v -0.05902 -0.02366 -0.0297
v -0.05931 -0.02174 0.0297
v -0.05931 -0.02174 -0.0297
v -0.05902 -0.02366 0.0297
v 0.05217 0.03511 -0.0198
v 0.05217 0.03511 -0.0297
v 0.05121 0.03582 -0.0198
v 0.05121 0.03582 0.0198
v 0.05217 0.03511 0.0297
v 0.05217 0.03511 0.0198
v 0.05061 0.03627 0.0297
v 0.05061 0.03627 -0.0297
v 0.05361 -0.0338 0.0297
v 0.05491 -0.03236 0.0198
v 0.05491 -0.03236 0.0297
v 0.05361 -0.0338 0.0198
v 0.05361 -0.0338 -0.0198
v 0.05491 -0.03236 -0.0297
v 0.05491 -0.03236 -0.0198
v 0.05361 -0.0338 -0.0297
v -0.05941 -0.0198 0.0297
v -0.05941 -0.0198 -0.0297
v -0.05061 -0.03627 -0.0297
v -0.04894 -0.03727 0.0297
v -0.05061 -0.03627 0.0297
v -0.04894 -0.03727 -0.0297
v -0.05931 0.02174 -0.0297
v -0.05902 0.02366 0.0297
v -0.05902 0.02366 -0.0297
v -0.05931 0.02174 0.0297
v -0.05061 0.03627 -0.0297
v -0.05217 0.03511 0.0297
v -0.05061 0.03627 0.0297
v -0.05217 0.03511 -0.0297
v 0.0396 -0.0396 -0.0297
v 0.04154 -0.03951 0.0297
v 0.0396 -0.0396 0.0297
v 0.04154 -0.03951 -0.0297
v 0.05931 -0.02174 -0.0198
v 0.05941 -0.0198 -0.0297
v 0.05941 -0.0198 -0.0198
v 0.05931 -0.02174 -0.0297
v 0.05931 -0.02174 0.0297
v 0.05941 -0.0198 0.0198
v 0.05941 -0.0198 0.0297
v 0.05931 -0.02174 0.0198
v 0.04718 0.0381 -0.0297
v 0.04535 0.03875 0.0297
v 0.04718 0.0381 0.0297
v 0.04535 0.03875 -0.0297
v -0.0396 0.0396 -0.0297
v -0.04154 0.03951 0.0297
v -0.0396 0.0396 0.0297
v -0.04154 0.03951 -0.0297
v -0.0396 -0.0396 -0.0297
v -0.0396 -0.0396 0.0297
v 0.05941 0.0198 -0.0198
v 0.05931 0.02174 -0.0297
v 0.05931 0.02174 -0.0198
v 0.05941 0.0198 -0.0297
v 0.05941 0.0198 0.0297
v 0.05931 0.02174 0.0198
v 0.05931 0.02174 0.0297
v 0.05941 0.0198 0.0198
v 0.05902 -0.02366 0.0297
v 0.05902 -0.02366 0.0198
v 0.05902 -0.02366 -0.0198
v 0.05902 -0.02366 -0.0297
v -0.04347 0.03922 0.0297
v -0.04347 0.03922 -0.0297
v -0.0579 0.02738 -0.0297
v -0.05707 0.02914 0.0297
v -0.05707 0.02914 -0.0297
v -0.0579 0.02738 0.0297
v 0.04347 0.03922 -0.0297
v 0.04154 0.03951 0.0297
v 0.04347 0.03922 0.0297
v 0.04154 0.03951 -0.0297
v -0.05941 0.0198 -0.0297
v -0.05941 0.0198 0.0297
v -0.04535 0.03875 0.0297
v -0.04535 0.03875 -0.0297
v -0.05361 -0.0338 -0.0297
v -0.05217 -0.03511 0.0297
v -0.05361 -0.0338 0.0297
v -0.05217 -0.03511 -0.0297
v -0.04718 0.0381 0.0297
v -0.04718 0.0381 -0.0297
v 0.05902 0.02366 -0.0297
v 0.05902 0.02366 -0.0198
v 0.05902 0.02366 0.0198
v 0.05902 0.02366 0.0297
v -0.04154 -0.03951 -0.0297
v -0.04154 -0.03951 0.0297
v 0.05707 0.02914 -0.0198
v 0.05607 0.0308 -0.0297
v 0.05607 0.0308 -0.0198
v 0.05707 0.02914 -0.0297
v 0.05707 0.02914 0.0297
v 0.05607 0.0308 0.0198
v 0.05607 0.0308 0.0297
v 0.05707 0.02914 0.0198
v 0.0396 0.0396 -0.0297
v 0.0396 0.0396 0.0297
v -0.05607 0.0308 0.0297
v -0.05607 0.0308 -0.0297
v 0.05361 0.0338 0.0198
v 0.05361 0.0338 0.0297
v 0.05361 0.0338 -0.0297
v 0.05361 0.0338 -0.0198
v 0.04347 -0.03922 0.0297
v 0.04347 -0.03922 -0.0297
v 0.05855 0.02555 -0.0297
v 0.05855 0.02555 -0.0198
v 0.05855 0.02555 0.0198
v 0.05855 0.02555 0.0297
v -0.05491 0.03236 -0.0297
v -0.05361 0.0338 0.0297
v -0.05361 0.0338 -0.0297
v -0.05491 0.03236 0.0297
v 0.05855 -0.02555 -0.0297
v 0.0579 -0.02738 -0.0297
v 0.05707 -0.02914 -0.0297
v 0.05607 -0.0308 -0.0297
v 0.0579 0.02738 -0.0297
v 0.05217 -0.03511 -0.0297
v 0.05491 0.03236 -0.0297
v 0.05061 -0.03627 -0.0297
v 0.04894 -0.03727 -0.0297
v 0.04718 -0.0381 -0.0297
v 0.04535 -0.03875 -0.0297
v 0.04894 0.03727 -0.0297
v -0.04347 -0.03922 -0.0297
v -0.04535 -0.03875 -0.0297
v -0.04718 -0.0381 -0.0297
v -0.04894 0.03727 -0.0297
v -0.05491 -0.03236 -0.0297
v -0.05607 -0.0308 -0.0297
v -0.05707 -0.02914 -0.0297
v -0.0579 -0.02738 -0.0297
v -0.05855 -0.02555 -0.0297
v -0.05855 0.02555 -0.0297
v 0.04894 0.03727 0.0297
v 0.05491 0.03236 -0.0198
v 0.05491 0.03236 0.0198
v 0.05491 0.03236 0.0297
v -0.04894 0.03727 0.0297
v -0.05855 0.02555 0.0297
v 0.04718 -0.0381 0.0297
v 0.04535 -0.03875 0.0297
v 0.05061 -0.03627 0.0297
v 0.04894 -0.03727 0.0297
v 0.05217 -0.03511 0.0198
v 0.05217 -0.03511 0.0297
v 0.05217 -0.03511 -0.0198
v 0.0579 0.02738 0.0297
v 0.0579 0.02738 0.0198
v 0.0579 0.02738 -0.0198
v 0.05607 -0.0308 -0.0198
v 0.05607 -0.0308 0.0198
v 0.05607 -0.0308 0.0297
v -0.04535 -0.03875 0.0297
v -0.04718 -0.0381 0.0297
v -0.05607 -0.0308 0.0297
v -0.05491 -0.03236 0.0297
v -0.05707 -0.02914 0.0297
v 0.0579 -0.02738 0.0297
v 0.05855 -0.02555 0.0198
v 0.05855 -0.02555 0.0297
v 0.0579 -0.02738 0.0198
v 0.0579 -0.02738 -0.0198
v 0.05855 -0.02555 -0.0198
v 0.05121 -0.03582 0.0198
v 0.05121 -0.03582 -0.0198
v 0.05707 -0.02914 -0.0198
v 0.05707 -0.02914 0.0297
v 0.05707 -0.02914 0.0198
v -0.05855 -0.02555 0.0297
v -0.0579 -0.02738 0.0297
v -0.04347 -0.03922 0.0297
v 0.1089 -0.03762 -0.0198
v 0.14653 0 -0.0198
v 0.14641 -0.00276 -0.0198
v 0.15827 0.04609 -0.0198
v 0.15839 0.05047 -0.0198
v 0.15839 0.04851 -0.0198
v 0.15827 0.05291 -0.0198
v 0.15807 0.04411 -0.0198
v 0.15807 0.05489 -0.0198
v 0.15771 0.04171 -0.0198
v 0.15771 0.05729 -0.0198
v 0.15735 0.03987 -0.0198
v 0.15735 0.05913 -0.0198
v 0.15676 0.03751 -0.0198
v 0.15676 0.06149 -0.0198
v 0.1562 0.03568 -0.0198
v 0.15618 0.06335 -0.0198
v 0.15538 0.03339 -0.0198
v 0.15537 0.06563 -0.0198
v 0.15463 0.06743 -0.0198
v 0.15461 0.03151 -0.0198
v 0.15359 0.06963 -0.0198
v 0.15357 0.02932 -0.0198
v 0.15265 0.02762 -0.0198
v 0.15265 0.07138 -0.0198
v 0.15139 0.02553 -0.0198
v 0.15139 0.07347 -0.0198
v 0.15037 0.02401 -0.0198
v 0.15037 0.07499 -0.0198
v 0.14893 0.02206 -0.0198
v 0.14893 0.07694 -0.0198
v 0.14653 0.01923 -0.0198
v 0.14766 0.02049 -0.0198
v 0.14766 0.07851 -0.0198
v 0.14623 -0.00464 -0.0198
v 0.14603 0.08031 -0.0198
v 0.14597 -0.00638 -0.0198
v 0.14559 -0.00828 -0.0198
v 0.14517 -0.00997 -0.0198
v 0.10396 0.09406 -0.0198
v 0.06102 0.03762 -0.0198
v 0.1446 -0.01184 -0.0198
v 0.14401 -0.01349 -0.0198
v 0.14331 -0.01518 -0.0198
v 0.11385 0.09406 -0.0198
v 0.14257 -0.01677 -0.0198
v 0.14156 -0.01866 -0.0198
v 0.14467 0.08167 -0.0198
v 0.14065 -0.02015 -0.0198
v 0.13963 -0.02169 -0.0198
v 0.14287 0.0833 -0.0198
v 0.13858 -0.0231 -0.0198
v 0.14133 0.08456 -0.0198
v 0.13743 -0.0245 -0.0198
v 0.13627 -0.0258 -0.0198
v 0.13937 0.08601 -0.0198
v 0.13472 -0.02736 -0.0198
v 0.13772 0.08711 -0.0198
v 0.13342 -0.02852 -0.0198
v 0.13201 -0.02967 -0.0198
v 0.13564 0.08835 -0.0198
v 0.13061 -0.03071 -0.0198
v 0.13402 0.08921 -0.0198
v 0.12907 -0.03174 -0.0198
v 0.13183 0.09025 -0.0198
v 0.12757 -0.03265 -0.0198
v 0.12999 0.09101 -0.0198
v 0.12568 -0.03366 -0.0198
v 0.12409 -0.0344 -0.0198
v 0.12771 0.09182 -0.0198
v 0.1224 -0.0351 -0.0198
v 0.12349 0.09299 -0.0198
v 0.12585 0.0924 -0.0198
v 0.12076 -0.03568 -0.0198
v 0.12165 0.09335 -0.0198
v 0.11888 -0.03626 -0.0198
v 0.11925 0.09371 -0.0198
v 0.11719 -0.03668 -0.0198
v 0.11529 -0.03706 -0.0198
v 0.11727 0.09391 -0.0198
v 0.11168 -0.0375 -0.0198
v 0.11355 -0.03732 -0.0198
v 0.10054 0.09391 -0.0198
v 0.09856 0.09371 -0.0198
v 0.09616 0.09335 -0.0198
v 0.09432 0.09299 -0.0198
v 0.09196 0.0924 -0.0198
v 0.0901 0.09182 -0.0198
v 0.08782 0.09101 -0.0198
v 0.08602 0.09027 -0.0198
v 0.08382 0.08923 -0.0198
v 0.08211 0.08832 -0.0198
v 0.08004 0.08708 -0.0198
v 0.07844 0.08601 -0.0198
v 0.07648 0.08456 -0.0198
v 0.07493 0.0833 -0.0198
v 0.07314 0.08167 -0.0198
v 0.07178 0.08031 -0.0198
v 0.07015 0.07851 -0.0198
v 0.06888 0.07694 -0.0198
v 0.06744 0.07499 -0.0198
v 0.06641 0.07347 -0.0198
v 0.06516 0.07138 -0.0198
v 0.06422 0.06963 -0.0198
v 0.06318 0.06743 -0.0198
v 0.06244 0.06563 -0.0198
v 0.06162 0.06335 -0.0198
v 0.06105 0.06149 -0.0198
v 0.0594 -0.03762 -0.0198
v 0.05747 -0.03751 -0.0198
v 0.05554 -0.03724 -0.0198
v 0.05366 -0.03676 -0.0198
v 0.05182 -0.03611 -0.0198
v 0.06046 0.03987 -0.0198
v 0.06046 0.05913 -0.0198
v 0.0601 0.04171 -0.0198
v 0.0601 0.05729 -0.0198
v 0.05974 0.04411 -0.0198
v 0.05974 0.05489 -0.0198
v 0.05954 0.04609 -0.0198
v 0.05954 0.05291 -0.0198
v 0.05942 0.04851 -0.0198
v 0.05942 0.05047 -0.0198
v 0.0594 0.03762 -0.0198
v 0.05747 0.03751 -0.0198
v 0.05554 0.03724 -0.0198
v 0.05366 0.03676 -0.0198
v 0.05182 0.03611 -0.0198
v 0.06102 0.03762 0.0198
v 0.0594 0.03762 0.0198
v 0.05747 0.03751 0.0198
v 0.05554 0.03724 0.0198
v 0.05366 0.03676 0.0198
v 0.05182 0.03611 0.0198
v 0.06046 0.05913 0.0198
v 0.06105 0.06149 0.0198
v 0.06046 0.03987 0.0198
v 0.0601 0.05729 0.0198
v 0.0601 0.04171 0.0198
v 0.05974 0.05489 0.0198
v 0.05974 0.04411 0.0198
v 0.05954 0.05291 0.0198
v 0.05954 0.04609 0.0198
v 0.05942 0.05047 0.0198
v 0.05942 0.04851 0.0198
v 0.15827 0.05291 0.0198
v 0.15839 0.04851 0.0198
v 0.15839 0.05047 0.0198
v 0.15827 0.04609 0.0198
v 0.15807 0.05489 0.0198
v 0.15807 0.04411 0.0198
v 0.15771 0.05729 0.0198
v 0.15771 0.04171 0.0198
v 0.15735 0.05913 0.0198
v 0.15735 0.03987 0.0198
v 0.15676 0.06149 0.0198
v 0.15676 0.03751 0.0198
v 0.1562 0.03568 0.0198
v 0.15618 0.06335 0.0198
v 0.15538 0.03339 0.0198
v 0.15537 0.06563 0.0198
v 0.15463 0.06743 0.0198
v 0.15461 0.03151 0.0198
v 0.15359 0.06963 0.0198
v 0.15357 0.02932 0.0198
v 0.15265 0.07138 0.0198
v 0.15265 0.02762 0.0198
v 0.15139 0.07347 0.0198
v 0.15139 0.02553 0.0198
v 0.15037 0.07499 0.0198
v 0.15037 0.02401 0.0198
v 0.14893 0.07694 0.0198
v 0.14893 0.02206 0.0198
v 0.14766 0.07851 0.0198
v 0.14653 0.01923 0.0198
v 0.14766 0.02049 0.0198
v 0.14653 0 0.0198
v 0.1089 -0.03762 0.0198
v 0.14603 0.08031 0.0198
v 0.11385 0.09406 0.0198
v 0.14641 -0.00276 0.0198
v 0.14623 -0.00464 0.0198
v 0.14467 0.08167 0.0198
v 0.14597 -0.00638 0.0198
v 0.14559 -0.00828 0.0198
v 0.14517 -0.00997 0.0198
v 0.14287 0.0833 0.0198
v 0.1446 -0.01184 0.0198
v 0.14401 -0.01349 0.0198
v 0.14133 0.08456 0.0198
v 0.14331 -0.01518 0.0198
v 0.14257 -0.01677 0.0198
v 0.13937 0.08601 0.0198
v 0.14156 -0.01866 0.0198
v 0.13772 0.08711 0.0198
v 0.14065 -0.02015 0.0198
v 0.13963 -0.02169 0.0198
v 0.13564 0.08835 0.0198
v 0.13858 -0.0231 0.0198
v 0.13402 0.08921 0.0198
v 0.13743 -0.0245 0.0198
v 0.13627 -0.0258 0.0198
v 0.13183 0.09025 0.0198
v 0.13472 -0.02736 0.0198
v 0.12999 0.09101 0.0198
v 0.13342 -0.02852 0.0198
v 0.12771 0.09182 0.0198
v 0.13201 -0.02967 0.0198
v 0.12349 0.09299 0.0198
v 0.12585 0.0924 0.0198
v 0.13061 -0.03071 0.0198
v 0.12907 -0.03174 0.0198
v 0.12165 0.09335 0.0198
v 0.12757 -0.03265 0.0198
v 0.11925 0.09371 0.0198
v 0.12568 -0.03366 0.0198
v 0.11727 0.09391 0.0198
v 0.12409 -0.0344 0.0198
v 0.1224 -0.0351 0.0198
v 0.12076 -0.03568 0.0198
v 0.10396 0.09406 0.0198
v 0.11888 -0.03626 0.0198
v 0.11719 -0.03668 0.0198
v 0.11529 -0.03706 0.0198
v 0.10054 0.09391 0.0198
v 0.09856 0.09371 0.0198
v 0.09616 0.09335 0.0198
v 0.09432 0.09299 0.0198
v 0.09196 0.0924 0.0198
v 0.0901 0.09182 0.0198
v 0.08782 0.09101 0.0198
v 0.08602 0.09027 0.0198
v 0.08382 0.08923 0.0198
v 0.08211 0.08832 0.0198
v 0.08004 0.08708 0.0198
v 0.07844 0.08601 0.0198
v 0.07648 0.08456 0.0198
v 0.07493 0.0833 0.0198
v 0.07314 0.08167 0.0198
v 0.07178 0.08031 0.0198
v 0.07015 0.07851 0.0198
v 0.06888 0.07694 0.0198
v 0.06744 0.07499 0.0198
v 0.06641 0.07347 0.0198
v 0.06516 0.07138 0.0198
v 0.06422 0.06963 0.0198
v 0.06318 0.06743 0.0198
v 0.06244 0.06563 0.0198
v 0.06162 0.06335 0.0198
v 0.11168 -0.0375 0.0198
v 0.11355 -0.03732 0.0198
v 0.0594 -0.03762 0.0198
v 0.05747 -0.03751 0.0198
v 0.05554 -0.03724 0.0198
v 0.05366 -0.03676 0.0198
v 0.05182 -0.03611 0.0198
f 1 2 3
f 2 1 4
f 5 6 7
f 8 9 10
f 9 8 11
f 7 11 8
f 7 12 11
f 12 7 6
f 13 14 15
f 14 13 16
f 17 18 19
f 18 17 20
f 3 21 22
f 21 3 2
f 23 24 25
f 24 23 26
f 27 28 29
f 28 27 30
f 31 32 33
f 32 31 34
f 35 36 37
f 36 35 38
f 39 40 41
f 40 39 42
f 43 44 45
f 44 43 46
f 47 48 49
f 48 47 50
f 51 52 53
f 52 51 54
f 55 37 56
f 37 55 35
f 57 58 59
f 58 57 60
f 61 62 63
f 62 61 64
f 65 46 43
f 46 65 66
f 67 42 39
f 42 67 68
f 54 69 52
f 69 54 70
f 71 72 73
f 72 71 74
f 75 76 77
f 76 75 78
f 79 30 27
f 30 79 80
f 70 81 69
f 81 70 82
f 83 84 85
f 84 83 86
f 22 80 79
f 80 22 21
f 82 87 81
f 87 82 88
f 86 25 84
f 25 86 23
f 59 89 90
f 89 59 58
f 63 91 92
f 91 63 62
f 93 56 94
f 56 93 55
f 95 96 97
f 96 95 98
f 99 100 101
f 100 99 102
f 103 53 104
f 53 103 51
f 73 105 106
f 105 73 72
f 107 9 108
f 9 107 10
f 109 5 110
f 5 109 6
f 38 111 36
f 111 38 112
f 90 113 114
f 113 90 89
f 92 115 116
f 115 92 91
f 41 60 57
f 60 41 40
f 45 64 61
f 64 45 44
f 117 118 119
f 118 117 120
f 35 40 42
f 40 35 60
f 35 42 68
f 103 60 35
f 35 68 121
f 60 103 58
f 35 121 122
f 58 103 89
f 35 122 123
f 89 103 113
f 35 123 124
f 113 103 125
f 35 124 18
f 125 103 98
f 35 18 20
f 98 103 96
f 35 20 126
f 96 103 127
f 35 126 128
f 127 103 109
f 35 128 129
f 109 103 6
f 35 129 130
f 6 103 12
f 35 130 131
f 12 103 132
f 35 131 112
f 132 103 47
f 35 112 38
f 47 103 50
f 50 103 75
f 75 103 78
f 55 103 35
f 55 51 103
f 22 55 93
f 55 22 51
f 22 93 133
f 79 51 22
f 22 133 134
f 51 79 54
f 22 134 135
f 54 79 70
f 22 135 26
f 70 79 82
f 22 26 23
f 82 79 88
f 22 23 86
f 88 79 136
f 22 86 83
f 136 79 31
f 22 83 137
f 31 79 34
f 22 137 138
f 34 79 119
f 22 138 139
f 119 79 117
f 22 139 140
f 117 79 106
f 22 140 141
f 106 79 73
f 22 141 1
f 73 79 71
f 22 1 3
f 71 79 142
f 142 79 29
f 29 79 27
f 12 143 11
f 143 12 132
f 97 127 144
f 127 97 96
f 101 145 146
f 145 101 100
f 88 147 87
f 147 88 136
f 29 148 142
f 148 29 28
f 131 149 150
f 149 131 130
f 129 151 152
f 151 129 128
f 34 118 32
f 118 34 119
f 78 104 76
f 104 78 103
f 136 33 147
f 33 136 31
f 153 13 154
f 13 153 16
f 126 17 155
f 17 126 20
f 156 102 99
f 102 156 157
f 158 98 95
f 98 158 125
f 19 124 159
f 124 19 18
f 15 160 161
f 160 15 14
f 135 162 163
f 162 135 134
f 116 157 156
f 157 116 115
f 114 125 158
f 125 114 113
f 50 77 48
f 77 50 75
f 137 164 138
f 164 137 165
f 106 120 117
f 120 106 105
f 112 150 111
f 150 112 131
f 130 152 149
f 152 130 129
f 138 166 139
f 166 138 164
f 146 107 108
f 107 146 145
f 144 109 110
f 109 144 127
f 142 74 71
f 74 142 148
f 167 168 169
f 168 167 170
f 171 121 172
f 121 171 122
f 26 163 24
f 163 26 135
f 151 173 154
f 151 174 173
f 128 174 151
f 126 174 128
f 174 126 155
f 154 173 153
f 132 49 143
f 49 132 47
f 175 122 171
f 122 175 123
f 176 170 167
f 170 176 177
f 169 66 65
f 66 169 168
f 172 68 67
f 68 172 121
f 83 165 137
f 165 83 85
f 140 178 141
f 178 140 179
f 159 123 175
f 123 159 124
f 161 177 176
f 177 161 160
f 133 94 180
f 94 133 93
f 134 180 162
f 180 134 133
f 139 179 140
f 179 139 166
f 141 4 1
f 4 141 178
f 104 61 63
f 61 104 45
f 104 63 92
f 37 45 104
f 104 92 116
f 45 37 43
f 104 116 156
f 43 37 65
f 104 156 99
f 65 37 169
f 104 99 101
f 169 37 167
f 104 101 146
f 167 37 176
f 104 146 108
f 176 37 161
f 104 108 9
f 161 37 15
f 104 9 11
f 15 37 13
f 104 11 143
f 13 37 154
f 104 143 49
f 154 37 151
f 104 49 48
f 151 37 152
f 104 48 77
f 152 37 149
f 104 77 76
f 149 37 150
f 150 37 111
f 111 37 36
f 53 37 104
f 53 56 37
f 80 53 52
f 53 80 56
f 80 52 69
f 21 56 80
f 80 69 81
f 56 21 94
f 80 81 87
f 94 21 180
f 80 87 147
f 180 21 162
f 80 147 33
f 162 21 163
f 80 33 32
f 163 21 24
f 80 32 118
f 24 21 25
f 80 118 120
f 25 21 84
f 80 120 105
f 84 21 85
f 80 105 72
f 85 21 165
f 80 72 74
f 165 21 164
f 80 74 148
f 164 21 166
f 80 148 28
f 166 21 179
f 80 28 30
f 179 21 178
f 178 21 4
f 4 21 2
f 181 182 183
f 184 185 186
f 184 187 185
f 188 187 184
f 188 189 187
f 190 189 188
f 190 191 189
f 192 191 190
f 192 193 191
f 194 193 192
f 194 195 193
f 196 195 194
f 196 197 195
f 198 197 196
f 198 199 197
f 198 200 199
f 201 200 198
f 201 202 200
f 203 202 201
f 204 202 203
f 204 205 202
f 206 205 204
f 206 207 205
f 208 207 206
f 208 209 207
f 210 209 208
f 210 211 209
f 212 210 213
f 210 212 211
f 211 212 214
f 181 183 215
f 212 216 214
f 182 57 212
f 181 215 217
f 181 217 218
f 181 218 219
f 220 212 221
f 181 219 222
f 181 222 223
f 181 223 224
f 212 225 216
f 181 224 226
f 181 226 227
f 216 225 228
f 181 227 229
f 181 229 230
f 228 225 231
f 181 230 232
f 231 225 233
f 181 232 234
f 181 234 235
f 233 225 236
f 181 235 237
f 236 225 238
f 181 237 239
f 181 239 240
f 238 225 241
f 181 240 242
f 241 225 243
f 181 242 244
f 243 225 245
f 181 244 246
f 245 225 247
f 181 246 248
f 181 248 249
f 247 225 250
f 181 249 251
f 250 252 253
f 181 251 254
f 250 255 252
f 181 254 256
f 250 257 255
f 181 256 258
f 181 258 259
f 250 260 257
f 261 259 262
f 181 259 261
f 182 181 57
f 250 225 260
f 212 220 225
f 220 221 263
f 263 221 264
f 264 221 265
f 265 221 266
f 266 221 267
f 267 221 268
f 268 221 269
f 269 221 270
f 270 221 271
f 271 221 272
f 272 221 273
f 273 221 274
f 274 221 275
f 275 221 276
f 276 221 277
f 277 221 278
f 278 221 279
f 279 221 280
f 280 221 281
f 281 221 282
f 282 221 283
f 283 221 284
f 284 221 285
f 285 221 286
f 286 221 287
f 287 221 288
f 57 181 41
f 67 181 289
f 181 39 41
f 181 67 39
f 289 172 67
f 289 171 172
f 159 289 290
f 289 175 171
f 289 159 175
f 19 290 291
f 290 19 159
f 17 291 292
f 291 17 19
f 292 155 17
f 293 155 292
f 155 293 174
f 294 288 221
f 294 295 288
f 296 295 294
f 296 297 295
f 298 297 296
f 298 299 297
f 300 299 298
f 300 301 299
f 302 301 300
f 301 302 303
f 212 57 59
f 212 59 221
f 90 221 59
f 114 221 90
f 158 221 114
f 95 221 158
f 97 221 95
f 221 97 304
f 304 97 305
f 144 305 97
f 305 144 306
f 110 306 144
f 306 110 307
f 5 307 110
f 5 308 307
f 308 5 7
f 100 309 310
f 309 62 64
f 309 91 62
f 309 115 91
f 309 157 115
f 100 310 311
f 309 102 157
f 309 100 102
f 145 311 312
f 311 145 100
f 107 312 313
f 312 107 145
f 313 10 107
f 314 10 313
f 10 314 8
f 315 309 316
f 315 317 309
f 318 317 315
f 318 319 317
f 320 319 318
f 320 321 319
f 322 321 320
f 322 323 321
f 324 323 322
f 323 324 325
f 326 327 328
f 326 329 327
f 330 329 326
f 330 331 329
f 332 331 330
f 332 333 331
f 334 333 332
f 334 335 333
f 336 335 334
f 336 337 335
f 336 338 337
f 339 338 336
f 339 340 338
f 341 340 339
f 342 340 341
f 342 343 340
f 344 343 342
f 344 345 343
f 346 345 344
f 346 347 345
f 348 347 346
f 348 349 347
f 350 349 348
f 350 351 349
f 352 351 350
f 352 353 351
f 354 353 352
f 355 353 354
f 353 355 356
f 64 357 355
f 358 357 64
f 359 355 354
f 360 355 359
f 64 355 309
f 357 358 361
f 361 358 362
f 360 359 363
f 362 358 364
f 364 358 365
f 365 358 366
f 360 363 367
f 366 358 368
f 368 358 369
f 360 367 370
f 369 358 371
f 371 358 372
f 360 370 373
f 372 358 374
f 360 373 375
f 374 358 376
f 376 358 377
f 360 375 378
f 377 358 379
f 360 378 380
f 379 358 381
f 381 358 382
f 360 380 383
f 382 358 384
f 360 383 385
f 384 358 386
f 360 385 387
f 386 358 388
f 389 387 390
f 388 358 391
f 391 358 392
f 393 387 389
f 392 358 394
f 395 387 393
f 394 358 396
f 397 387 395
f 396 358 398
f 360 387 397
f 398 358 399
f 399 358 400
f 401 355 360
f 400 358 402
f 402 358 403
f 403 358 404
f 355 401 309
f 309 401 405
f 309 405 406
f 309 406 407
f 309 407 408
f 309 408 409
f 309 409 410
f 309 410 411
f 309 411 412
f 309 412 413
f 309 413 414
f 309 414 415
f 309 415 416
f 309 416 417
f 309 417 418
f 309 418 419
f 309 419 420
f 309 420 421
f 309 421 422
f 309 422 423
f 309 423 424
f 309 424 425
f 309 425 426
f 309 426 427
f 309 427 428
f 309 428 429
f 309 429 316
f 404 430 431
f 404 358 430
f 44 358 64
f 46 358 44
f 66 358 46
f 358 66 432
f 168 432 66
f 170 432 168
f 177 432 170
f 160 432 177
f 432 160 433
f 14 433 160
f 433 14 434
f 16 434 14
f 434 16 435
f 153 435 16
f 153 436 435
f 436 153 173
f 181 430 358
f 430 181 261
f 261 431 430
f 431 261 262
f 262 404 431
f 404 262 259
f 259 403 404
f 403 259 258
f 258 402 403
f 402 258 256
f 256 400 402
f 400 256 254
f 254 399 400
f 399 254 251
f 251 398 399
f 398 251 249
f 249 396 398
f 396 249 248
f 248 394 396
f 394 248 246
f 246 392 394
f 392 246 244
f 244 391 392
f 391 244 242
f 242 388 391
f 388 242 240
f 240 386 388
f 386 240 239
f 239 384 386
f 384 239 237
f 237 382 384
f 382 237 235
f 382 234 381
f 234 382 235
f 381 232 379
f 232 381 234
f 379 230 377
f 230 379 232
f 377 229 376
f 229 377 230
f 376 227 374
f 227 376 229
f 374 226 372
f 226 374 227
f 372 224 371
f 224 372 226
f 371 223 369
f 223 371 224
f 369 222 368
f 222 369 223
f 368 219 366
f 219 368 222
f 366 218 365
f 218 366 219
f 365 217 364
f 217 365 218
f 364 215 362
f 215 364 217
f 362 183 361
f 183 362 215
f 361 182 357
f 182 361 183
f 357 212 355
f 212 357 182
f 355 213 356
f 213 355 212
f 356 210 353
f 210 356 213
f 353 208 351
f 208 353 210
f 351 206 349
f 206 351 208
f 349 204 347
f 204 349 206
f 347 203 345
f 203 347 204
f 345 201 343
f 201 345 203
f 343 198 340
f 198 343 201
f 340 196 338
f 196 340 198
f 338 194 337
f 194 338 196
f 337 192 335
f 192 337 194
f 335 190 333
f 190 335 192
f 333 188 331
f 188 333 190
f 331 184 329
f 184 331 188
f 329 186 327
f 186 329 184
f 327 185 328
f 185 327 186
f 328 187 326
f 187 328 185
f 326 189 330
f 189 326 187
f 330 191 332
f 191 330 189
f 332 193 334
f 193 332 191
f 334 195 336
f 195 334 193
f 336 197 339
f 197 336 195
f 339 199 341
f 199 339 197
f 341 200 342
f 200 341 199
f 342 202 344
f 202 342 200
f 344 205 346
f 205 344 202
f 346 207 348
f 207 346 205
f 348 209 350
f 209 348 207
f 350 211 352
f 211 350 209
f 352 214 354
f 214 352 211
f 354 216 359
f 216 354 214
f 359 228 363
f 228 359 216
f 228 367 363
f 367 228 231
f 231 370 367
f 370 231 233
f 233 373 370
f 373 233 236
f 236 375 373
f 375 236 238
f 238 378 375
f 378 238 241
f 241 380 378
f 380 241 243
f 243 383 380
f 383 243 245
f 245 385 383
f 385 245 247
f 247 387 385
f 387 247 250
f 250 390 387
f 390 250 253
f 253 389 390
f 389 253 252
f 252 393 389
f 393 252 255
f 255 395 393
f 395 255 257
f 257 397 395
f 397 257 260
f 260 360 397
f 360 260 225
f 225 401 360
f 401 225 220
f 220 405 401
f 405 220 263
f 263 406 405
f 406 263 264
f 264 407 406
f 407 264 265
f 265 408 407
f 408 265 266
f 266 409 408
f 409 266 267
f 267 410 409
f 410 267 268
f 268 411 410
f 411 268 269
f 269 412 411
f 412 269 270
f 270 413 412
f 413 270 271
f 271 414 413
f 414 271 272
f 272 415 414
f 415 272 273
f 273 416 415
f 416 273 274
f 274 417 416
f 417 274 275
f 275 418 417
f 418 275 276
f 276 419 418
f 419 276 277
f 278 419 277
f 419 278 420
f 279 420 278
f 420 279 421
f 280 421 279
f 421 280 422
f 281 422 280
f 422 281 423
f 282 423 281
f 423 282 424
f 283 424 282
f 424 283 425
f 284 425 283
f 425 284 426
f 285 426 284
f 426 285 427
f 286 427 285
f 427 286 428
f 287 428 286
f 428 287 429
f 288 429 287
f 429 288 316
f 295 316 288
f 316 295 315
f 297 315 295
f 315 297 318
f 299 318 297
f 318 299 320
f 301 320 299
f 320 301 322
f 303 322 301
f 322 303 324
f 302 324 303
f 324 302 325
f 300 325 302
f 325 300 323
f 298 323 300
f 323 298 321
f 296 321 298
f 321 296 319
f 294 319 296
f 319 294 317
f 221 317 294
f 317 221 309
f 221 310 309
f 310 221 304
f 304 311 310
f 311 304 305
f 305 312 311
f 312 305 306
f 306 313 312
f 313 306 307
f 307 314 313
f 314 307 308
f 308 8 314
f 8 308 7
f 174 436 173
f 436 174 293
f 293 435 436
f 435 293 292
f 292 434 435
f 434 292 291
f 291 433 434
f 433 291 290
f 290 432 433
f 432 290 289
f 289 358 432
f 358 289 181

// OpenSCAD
$fn=64;

mm = 1;

bbox_x = 0.2*mm;
bbox_y = 0.1*mm;
bbox_z = 0.1*mm;

base_x = 0.12*mm;
base_y = 0.08*mm;
base_z = 0.06*mm;
base_r = 0.02*mm;

arm_z = 0.04*mm;
arm_r = arm_z/2;

neck_w = 0.028*mm;
neck_len = 0.03*mm;

arm_w = 0.036*mm;
arm_len1 = 0.05*mm;
arm_len2 = 0.05*mm;

end_w = 0.05*mm;
end_len = 0.04*mm;

boss_w = 0.012*mm;
boss_len = 0.016*mm;
boss_h = 0.02*mm;

module rounded_rect_2d(x,y,r){
    hull(){
        translate([ x/2 - r,  y/2 - r]) circle(r=r);
        translate([-x/2 + r,  y/2 - r]) circle(r=r);
        translate([ x/2 - r, -y/2 + r]) circle(r=r);
        translate([-x/2 + r, -y/2 + r]) circle(r=r);
    }
}

module obround_2d(len,w){
    r = w/2;
    hull(){
        translate([ len/2 - r, 0]) circle(r=r);
        translate([-len/2 + r, 0]) circle(r=r);
    }
}

module base_block(){
    linear_extrude(height=base_z, center=true)
        rounded_rect_2d(base_x, base_y, base_r);
}

module arm_path_2d(){
    union(){
        translate([base_x/2 - neck_len/2, 0])
            square([neck_len, neck_w], center=true);

        translate([base_x/2 + arm_len1/2, 0])
            square([arm_len1, arm_w], center=true);

        translate([base_x/2 + arm_len1, arm_len2/2])
            square([arm_w, arm_len2], center=true);

        translate([base_x/2 + arm_len1, 0])
            circle(r=arm_w/2);

        translate([base_x/2 + arm_len1, arm_len2])
            circle(r=arm_w/2);

        translate([base_x/2 + arm_len1, arm_len2])
            obround_2d(end_len, end_w);
    }
}

module arm_solid(){
    linear_extrude(height=arm_z, center=true)
        offset(r=arm_r)
            arm_path_2d();
}

module neck_bosses(){
    x0 = base_x/2 - neck_len*0.55;
    yoff = neck_w/2 + boss_w/2;
    union(){
        translate([x0,  yoff, 0])
            cube([boss_len, boss_w, boss_h], center=true);
        translate([x0, -yoff, 0])
            cube([boss_len, boss_w, boss_h], center=true);
    }
}

module bracket(){
    union(){
        base_block();
        arm_solid();
        neck_bosses();
    }
}

scale_factor = min(bbox_x/(base_x + arm_len1 + end_len*0.8), bbox_y/(base_y), bbox_z/(base_z + 0.02*mm));
scale([scale_factor, scale_factor, scale_factor]) bracket();
